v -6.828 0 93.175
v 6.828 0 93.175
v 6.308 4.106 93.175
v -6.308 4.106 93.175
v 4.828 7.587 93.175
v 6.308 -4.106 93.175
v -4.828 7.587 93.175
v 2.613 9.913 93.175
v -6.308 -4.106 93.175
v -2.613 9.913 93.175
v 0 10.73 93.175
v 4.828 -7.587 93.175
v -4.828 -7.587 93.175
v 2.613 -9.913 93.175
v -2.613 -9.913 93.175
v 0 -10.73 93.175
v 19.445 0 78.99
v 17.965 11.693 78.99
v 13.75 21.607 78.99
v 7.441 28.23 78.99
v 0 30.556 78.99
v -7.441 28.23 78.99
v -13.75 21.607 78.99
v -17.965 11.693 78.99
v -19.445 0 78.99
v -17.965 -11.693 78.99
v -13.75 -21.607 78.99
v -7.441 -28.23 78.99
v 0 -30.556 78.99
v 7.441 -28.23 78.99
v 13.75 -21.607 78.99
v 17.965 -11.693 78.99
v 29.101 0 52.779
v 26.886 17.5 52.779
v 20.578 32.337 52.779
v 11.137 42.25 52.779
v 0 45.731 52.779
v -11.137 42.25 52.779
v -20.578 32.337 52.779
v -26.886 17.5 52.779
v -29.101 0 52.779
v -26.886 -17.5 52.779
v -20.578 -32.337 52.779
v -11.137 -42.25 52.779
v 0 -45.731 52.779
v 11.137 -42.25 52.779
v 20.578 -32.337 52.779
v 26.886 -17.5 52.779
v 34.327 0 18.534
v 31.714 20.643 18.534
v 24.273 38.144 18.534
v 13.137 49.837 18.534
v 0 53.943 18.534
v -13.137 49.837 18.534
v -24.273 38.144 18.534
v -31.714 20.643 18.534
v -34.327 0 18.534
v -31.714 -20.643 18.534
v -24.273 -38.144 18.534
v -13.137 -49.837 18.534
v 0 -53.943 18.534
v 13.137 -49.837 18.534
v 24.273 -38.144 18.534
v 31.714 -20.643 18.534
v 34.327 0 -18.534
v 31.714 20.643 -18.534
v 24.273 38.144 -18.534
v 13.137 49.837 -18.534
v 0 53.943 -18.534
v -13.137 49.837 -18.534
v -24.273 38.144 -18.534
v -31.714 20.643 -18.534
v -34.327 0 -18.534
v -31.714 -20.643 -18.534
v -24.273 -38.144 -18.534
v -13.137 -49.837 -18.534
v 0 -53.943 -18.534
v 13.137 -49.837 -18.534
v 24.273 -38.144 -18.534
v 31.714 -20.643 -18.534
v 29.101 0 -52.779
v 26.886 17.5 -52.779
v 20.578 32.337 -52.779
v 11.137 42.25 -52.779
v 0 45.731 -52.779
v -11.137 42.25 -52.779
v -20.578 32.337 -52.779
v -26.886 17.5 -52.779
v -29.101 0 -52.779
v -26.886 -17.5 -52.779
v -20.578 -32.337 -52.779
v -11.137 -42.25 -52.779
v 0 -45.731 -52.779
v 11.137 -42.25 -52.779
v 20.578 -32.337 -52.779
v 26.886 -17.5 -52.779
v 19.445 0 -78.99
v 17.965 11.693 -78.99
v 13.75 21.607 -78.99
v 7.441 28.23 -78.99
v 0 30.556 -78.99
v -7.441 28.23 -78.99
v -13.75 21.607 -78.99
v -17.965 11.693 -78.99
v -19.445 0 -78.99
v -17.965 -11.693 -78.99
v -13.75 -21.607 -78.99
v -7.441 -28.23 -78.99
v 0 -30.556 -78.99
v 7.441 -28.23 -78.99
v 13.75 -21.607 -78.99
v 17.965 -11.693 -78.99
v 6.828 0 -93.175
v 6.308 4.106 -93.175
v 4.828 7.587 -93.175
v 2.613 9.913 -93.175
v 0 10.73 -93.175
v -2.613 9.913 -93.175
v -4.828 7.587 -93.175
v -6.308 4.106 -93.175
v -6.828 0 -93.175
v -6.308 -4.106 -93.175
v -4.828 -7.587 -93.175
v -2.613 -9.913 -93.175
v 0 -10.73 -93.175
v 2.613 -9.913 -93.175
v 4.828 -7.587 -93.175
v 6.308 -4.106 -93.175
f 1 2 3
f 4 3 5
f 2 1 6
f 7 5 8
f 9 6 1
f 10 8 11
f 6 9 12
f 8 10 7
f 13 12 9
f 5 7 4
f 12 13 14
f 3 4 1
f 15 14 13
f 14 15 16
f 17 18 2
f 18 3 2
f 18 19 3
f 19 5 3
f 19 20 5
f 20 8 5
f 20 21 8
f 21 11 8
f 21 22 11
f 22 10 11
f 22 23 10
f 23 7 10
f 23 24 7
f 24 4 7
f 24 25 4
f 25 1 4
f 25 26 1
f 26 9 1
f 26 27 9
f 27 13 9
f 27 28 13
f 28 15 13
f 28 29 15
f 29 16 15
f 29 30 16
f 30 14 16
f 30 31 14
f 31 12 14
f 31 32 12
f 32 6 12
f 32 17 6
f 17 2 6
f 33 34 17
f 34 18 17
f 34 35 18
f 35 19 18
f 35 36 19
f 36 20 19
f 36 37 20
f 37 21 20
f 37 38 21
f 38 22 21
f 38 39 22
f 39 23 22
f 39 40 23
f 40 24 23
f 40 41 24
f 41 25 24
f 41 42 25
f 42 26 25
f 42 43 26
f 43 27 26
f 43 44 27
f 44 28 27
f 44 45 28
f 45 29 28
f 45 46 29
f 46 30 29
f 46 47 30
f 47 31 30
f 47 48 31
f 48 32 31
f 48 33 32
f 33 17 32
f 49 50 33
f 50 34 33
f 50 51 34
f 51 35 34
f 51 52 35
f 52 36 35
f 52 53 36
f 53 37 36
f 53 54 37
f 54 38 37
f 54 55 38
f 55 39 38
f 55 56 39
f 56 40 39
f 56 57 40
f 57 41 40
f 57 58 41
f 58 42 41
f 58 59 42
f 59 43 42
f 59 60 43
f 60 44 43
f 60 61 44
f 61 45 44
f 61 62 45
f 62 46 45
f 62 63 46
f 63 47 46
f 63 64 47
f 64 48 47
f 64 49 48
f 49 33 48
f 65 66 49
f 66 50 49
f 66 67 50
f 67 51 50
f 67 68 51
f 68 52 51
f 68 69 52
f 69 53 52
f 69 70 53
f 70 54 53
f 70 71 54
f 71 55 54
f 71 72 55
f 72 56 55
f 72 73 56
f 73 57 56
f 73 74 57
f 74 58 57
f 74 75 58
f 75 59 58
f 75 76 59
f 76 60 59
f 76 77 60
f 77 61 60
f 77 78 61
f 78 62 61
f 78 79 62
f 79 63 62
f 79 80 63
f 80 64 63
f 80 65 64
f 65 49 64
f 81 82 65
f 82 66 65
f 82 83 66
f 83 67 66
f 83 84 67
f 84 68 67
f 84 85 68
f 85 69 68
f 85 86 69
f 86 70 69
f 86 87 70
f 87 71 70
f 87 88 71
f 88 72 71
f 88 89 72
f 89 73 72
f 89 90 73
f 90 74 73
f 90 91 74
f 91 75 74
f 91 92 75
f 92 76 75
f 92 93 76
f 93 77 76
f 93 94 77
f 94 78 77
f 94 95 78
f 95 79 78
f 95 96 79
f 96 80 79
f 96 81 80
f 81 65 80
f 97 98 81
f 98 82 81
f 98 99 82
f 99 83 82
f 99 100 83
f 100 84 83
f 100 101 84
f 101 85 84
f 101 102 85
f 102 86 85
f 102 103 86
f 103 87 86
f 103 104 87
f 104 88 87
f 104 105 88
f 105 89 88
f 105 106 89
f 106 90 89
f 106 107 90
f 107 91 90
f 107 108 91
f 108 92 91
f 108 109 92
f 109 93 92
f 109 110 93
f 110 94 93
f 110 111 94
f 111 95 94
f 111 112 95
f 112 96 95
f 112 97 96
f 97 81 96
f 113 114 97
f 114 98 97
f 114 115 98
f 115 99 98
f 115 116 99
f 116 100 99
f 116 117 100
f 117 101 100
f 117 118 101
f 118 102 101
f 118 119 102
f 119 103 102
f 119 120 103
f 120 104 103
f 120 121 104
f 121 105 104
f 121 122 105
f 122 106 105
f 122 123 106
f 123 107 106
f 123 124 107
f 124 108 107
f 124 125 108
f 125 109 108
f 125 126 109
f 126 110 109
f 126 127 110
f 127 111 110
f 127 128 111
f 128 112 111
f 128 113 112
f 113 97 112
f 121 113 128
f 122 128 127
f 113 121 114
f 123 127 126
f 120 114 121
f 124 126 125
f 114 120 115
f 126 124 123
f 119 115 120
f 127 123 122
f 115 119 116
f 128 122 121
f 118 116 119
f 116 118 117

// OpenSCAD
// Generated by SolidPython 1.0.1 on 2020-07-29 00:46:47


scale(v = [7, 11, 19]) {
	sphere(r = 5);
}
/***********************************************
*********      SolidPython code:      **********
************************************************
 
# import packages: SolidPython
from solid import *
from solid.utils import *
from itertools import chain, combinations, permutations


class Resize:

    def __init__(self, scad_file):
        self.scad_file = scad_file
        #self.scad_file = import_scad(scad_file)
        # cone/cylinder param:
        self.r1 = 0
        self.r2 = 0
        self.h = 0
        # rectangular prism param:
        self.w = 0
        self.l = 0
        # ellipse param:
        self.r = 0

    # import OpenScad code (file name corresponds to shape)


    # classify shape + parameters
    def assign(self, param1, param2, param3):
        if self.scad_file == 'cone.scad':
            self.r1 = param1
            self.r2 = param2
            self.h = param3
        elif self.scad_file == 'cylinder.scad':
            self.r1 = param1
            self.r2 = param2
            self.h = param3
        elif self.scad_file == 'rectangularPrism.scad':
            self.h = param1
            self.l = param2
            self.w = param3
        else:
            self.r = param1
            self.h = param2

    # resize parameters
    def iterate(self):
        x = range(3, 20, 2)
        i = 1
        if self.scad_file == 'cone.scad':
            tempList = list(permutations(x, 2))
            for temp in tempList:
                param1 = temp[0]
                param2 = temp[1]
                filepath = 'produced_scad_files/' + 'cone' + str(param1) + '_' + str(param2) + '_' + '.scad'
                scad_render_to_file(cylinder(h=param1, r1=param2, r2=0), filepath)

        elif self.scad_file == 'cylinder.scad':
            tempList = list(permutations(x, 3))
            for temp in tempList:
                param1 = temp[0]
                param2 = temp[1]
                filepath = 'produced_scad_files/' + 'cylinder' + str(param1) + '_' + str(param2) + '_' + '.scad'
                scad_render_to_file(cylinder(h=param1, r1=param2, r2=param2), filepath)

        elif self.scad_file == 'rectangularPrism.scad':
            tempList = list(permutations(x, 3))
            for temp in tempList:
                param1 = temp[0]
                param2 = temp[1]
                param3 = temp[2]
                filepath = 'produced_scad_files/' + 'rectangularPrism' + str(param1) + '_' + str(param2) + '_' + str(
                    param3) + '.scad'
                scad_render_to_file(cube(size=(param1, param2, param3)), filepath)

        elif self.scad_file == 'ellipse.scad':
            tempList = list(permutations(x, 4))
            for temp in tempList:
                param1 = temp[0]
                param2 = temp[1]
                param3 = temp[2]
                param4 = temp[3]
                filepath = 'produced_scad_files/' + 'ellipse' + str(param1) + '_' + str(param2) + '_' + str(param3) + '_' + str(param4) + '.scad'
                scad_render_to_file(scale([param1, param2, param3])(sphere(r=param4)), filepath)

    def render_to_scadfile(self):
        scad_render_to_file(scad, 'example.scad') 
 
************************************************/
